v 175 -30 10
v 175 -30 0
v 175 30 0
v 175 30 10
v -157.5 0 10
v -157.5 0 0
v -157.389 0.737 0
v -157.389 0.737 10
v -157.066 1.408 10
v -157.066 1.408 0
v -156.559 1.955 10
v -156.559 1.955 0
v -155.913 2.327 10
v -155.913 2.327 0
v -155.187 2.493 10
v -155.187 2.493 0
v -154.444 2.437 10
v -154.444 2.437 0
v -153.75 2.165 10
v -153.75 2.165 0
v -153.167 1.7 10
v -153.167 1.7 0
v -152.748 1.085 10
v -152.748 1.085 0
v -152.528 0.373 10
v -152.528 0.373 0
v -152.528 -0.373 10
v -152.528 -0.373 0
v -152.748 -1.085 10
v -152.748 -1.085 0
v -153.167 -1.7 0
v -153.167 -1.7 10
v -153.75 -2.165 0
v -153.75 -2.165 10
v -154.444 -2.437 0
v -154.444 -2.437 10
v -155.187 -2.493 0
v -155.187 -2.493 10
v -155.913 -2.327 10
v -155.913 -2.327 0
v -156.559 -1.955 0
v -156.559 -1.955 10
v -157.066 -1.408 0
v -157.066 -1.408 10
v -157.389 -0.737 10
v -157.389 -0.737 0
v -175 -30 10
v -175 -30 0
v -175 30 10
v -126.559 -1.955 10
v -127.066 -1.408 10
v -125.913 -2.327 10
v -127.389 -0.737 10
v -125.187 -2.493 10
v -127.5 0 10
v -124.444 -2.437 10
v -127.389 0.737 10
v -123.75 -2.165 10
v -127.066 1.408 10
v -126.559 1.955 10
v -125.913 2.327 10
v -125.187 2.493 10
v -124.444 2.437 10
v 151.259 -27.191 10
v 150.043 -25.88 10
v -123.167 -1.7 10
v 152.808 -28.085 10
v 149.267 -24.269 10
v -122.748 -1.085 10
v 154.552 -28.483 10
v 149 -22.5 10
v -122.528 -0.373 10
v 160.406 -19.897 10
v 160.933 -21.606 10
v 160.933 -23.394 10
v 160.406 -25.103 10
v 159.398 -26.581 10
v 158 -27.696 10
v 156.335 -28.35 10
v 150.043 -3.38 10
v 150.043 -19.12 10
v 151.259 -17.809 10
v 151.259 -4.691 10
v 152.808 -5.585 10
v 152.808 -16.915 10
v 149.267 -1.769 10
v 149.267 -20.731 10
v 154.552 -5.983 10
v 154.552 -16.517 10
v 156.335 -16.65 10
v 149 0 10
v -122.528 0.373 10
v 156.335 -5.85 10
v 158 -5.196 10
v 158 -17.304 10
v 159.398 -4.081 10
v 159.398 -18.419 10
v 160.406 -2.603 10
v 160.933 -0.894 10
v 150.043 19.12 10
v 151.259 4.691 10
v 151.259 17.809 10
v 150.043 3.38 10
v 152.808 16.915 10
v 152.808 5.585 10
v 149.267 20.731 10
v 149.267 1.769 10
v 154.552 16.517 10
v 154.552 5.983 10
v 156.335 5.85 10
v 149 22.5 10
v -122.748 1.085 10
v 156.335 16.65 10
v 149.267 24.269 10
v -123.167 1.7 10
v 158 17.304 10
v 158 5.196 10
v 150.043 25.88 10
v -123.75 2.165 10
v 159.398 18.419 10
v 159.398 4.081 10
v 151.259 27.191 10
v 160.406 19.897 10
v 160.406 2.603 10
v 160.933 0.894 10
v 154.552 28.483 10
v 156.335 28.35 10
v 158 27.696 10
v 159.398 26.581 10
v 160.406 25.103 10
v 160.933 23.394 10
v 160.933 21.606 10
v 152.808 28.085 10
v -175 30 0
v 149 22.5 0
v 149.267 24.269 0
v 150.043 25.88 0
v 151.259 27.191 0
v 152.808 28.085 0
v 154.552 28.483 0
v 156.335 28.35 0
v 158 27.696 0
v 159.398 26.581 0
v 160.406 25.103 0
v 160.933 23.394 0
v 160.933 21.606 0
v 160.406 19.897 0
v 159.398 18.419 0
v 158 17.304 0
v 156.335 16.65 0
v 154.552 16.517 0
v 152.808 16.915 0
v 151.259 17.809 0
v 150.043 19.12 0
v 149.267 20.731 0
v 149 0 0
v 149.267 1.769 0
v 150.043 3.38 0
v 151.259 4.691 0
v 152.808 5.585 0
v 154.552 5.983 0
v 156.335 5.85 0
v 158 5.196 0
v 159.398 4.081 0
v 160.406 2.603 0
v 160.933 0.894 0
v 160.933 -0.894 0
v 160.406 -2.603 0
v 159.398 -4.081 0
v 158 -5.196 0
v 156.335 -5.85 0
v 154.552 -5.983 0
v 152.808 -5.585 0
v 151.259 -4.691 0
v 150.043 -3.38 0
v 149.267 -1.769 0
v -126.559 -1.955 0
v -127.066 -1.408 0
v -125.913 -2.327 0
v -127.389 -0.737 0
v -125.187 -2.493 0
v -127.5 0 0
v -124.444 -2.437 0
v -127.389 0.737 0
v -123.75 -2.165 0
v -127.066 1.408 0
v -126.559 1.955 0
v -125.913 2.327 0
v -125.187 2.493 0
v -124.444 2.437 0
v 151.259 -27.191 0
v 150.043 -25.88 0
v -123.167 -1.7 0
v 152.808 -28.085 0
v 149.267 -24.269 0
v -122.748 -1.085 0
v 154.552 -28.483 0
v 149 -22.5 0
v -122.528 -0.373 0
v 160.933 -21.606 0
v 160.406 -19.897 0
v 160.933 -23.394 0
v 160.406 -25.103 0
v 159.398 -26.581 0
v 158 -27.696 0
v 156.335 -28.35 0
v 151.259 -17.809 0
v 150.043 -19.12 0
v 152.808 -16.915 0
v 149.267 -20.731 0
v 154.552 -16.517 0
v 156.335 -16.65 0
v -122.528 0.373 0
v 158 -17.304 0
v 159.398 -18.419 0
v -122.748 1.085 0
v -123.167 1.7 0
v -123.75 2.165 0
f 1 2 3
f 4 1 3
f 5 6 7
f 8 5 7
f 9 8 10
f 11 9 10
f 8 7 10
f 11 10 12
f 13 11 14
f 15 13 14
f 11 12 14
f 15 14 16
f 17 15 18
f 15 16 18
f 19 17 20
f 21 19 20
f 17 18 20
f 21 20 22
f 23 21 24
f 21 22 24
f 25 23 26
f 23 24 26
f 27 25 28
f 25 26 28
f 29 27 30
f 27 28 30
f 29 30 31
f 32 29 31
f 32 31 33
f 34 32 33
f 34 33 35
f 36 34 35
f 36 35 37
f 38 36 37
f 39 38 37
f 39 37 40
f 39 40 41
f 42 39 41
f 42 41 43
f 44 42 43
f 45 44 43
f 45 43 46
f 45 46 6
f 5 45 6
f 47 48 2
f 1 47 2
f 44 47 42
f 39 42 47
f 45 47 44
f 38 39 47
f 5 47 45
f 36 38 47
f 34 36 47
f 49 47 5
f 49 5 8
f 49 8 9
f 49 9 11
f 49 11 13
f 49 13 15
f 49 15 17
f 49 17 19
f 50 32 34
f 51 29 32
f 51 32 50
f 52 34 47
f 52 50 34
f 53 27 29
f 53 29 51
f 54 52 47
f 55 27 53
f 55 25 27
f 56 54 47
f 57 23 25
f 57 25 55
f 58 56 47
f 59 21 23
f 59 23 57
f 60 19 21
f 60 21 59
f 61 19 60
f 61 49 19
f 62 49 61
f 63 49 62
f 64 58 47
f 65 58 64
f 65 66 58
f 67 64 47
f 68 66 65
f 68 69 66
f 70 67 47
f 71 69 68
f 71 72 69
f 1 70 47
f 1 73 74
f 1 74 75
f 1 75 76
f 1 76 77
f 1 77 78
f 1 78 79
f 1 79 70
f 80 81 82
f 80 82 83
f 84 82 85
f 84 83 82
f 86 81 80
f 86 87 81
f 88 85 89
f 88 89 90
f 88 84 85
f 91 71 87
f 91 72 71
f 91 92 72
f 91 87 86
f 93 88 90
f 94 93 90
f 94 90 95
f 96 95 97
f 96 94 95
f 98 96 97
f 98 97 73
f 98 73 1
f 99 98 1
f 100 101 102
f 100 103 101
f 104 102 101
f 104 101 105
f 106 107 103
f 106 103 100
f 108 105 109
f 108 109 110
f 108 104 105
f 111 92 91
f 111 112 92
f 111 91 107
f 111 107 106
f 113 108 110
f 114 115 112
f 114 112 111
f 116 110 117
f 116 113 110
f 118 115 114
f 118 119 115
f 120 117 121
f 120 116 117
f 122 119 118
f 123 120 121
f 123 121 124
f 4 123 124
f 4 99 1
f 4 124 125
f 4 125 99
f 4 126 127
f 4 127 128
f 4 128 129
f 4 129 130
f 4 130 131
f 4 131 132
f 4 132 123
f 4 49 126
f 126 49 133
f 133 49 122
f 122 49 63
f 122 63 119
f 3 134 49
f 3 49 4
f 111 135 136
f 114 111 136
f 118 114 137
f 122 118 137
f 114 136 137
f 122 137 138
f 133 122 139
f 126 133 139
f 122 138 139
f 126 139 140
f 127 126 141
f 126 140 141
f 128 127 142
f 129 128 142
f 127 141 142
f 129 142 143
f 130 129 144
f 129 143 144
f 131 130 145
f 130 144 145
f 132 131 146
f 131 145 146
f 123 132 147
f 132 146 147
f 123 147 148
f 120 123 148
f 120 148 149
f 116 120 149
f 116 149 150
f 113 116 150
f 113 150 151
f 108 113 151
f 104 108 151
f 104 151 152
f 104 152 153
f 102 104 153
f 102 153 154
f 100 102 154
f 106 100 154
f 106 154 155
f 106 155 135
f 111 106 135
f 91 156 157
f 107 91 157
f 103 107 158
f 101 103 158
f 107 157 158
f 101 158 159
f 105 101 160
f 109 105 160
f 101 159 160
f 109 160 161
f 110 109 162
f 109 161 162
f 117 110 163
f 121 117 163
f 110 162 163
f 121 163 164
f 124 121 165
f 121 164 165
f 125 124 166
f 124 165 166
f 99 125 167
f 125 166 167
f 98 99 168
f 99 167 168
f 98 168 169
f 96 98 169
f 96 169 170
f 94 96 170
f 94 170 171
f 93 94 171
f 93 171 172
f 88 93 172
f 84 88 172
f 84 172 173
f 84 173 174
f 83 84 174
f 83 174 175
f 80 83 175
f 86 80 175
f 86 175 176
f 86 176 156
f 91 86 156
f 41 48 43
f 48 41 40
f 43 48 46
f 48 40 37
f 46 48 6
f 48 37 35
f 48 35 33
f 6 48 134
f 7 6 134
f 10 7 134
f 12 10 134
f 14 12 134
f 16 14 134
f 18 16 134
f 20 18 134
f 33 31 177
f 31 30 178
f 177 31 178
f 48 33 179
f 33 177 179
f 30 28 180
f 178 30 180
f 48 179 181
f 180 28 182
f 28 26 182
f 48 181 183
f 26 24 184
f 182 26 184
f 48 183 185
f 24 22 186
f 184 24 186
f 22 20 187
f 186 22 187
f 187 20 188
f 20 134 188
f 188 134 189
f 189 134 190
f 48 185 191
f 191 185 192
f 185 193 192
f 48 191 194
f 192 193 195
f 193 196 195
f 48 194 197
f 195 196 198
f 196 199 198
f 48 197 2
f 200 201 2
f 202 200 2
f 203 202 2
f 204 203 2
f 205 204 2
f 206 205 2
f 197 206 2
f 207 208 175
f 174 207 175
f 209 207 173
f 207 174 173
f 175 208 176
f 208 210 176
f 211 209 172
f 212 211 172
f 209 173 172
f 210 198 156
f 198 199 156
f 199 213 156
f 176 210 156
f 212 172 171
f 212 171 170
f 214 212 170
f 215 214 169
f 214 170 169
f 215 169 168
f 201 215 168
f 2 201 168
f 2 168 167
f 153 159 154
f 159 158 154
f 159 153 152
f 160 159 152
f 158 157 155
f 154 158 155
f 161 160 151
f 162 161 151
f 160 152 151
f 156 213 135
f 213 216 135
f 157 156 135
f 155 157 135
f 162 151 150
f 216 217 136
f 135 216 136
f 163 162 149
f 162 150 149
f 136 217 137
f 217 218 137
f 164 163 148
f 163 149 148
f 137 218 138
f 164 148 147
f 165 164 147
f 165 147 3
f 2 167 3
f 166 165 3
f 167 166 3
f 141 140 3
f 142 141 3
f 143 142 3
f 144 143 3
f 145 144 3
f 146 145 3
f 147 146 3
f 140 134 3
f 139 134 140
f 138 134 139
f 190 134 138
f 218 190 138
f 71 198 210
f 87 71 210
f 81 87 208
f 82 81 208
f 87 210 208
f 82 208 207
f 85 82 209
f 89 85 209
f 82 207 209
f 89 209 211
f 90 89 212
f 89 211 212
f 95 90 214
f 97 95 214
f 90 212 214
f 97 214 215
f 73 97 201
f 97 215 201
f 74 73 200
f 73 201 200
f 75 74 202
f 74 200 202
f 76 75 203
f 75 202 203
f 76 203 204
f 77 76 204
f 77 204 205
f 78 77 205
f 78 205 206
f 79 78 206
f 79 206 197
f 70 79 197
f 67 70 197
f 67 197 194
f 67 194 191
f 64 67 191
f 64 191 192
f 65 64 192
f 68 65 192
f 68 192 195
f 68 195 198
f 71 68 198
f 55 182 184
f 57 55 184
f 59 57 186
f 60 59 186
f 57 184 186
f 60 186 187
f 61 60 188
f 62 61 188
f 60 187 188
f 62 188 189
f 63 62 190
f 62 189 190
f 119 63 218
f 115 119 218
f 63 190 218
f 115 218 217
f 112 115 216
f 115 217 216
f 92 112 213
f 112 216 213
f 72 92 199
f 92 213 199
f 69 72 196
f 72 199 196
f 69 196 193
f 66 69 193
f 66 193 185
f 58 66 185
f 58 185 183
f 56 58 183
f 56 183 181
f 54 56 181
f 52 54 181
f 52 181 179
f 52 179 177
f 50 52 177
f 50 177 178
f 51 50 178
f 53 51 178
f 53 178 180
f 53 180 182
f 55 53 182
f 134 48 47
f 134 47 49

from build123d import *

# Parameters (mm, degrees)
SKETCH_1_W             = 350
SKETCH_1_H             = 60
EXTRUDE_1_DEPTH        = 10
HOLE_WIZARD_M6_1_D     = 5
HOLE_WIZARD_M6_1_DEPTH = 20
HOLE_WIZARD_M6_1_TIP   = 1.502151548
MM_1_D                 = 12
MM_1_DEPTH             = 20
MM_1_TIP               = 3.605163714


with BuildPart() as part:
    # 草图1 → 凸台-拉伸1 (new body)
    with BuildSketch(Plane.XY):
        Rectangle(SKETCH_1_W, SKETCH_1_H)
    extrude(amount=EXTRUDE_1_DEPTH)

    # M6 螺纹孔1
    with Locations(Plane(origin=(-155, 0, 10), x_dir=(1, 0, 0), z_dir=(0, 0, 1))):
        with Locations((0, 0), (30, 0)):
            Hole(HOLE_WIZARD_M6_1_D / 2, depth=HOLE_WIZARD_M6_1_DEPTH)
            with Locations((0, 0, -(HOLE_WIZARD_M6_1_DEPTH + HOLE_WIZARD_M6_1_TIP / 2))):  # 118° drill point
                Cone(0, HOLE_WIZARD_M6_1_D / 2, HOLE_WIZARD_M6_1_TIP, mode=Mode.SUBTRACT)

    # 大小mm 暗销槽口1
    with Locations(Plane.XY.offset(10)):
        with Locations((155, -22.5), (155, 0), (155, 22.5)):
            Hole(MM_1_D / 2, depth=MM_1_DEPTH)
            with Locations((0, 0, -(MM_1_DEPTH + MM_1_TIP / 2))):  # 118° drill point
                Cone(0, MM_1_D / 2, MM_1_TIP, mode=Mode.SUBTRACT)


solid = part.part
